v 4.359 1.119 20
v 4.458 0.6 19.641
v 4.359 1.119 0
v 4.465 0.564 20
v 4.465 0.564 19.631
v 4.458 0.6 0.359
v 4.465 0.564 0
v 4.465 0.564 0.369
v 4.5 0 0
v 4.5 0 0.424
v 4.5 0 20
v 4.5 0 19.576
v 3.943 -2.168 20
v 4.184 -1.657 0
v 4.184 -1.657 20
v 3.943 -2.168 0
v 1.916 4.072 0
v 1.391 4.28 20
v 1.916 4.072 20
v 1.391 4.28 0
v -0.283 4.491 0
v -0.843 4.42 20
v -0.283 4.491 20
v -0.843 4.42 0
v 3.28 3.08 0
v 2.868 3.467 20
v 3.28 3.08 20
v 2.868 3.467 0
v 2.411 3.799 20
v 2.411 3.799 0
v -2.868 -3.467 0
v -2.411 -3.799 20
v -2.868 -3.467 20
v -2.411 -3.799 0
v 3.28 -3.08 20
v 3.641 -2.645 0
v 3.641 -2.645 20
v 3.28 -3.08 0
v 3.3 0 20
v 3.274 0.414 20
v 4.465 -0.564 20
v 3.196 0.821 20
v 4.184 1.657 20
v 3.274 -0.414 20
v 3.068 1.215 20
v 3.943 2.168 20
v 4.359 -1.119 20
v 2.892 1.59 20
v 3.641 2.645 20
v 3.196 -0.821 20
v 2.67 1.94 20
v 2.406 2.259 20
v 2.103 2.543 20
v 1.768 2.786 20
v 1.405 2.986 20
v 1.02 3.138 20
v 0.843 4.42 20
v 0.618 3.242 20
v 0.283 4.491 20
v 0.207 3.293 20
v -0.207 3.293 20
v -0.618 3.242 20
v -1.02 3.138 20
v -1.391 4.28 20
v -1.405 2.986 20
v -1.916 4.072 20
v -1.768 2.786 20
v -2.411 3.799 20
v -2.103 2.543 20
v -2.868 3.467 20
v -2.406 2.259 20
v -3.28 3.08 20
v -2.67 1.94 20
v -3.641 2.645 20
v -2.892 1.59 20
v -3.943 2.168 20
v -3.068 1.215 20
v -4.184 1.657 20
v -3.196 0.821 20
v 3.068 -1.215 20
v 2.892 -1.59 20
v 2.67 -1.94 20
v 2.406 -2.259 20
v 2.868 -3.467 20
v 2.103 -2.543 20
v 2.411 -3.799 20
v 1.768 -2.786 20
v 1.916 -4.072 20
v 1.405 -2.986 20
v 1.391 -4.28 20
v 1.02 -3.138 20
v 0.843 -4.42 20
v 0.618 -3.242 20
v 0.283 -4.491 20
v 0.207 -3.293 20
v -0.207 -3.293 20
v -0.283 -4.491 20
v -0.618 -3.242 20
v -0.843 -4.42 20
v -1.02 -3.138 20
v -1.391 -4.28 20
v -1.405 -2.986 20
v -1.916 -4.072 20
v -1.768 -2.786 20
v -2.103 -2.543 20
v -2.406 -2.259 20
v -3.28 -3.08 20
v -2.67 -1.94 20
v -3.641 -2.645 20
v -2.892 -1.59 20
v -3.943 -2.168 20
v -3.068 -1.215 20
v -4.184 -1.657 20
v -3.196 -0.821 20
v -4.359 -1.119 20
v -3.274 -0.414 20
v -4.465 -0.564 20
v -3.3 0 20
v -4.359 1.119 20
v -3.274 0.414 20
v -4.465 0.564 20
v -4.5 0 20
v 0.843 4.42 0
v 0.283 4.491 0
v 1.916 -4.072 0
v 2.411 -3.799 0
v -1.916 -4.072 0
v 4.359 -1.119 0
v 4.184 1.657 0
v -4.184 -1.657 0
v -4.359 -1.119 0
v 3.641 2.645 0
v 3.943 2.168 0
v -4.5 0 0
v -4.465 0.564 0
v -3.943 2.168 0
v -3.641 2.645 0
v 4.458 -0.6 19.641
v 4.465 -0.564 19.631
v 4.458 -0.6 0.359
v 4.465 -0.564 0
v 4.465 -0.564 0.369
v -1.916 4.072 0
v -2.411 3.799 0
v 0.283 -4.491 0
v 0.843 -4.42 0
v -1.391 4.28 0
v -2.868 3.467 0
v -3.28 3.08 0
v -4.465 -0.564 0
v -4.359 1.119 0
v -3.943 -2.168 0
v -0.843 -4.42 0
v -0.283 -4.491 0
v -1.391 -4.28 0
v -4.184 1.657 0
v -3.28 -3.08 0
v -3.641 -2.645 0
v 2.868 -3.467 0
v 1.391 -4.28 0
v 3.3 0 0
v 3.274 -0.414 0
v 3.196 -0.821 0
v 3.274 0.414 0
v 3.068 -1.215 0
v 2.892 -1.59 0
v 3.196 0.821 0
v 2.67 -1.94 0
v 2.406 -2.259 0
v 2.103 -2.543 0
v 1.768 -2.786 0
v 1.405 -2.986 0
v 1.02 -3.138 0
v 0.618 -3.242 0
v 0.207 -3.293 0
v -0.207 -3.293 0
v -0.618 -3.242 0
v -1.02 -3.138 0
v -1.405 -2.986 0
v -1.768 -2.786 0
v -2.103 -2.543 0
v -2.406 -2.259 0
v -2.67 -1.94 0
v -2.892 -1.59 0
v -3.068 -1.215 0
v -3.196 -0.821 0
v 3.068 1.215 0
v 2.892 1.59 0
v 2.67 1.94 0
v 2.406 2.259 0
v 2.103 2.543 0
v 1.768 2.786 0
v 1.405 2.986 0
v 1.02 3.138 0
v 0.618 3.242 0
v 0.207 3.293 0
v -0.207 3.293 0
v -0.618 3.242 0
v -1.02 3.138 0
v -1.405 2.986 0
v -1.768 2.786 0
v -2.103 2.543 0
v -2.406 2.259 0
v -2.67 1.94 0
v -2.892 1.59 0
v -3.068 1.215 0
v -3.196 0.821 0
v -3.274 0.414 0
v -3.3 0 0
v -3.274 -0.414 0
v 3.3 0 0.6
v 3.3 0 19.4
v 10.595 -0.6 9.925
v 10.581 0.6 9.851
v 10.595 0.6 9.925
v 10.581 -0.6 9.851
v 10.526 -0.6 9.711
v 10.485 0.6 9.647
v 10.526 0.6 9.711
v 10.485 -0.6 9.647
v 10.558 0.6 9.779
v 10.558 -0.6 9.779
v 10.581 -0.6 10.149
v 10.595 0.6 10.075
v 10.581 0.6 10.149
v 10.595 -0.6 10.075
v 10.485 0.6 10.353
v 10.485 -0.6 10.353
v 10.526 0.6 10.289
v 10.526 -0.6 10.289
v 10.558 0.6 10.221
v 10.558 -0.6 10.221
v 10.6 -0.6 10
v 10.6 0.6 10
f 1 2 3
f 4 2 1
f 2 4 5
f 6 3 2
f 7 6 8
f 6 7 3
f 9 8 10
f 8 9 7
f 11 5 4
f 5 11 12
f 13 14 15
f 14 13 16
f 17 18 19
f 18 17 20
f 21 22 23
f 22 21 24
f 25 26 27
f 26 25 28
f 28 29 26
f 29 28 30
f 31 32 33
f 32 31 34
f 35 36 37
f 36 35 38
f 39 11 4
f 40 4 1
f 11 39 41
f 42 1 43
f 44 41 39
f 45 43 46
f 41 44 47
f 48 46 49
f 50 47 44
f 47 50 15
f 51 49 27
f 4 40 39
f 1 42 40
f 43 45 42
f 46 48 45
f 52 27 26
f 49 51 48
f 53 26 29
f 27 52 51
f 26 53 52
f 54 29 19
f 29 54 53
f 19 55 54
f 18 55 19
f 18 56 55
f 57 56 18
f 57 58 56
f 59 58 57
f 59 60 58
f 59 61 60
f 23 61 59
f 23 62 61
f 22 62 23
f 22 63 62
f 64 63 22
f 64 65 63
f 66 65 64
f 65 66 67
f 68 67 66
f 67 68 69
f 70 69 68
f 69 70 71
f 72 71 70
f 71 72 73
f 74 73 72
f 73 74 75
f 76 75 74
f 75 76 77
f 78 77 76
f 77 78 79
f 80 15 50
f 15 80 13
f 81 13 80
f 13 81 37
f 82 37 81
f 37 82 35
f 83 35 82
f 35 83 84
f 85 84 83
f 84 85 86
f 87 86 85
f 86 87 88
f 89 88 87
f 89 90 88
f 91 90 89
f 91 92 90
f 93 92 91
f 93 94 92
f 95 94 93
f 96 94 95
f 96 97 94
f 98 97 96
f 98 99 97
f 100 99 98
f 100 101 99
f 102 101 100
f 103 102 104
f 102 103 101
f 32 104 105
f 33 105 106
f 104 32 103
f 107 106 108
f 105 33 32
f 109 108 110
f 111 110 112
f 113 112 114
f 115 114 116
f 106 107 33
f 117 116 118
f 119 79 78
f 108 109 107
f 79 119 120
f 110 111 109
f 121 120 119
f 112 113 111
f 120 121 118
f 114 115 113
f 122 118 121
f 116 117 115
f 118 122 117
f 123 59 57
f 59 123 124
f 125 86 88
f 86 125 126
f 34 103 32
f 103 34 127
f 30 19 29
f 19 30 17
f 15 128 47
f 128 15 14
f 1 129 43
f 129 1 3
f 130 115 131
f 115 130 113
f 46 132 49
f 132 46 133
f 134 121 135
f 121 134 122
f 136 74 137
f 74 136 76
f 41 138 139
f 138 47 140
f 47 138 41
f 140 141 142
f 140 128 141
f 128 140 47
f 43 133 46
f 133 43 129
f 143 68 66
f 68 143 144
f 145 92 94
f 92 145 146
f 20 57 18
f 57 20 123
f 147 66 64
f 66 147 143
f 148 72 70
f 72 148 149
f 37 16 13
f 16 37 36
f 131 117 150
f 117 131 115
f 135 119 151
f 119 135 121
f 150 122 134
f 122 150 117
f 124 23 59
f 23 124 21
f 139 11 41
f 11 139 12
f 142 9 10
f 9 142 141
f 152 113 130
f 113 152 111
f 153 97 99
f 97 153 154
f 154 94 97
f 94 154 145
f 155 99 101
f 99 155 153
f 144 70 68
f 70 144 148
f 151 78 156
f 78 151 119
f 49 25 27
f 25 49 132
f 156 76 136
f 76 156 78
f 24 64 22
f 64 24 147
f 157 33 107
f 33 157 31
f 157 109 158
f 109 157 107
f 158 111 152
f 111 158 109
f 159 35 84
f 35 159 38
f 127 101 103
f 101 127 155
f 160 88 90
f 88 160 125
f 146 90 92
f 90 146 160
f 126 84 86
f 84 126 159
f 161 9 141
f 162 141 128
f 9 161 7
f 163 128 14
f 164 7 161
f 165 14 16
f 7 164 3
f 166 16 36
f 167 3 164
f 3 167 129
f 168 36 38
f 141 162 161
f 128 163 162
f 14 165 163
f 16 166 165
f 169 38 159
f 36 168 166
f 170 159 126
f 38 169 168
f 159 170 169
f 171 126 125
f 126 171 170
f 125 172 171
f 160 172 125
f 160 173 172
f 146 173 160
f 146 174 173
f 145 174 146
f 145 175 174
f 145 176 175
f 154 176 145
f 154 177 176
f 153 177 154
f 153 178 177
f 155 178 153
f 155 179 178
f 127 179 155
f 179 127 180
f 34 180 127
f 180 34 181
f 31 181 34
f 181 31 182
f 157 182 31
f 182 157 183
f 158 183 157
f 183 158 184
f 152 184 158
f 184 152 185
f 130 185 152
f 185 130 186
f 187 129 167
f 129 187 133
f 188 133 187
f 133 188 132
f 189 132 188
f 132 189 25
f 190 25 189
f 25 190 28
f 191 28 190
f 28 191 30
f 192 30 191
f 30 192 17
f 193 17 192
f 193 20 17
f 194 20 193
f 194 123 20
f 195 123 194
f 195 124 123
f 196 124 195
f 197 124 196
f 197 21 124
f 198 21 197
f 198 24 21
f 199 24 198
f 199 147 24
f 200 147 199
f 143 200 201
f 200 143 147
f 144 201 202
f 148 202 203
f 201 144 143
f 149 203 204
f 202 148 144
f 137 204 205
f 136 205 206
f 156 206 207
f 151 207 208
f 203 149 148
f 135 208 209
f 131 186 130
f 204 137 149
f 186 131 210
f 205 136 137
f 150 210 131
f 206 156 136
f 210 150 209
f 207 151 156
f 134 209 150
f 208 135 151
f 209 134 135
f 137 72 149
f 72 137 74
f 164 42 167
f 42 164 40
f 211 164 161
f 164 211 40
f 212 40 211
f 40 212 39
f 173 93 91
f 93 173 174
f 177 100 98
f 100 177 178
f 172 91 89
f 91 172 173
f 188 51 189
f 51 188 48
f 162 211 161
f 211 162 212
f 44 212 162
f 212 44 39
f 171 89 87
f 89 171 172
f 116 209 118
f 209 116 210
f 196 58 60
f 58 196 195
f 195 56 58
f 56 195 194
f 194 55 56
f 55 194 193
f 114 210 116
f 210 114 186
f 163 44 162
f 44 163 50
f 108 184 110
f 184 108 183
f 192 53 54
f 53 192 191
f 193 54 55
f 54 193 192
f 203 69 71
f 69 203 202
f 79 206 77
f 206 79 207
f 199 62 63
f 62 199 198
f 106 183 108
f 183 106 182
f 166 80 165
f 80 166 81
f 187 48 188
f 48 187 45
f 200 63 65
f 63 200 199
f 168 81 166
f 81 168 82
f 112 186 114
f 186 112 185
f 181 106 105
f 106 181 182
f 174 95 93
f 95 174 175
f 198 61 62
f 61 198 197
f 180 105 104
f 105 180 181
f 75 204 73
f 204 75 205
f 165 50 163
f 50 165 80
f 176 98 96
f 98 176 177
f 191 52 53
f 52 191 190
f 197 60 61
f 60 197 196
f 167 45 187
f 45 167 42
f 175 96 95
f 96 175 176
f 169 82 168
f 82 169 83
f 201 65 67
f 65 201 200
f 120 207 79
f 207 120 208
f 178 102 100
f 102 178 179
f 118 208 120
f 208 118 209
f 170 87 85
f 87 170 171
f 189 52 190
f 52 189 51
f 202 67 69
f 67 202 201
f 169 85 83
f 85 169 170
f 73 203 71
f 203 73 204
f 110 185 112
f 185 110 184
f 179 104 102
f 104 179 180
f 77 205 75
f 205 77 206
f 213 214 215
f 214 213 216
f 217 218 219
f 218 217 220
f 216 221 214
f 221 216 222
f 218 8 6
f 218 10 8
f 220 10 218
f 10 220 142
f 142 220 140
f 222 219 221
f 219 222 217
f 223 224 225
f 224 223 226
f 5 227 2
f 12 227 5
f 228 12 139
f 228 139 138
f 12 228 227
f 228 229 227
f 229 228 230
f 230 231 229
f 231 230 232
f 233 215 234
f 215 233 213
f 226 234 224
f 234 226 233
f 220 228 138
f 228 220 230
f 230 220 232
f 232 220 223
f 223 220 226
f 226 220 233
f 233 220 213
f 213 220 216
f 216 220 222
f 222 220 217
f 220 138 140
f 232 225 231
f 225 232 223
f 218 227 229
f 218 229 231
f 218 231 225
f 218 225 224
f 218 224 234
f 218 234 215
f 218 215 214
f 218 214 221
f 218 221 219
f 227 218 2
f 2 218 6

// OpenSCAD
// screw guide
$fn = 50;
FUDGE = 0.001;

body_l = 20.0;
inside_d = 6.6;
wall = 1.2;
outside_d = inside_d + wall*2;

union() {
  difference() {
    cylinder(h=body_l, d=outside_d);
    translate([0, 0, -FUDGE/2])
      cylinder(h=body_l+FUDGE, d=inside_d);
  }
  hull() {
    translate([outside_d/2-wall/2, 0, wall/2])
      rotate([90, 0, 0])
        cylinder(h=wall, d=wall, center=true);
    translate([body_l/2, 0, body_l/2])
      rotate([90, 0, 0])
        cylinder(h=wall, d=wall, center=true);
    translate([outside_d/2-wall/2, 0, body_l-wall/2])
      rotate([90, 0, 0])
        cylinder(h=wall, d=wall, center=true);
  }
}
